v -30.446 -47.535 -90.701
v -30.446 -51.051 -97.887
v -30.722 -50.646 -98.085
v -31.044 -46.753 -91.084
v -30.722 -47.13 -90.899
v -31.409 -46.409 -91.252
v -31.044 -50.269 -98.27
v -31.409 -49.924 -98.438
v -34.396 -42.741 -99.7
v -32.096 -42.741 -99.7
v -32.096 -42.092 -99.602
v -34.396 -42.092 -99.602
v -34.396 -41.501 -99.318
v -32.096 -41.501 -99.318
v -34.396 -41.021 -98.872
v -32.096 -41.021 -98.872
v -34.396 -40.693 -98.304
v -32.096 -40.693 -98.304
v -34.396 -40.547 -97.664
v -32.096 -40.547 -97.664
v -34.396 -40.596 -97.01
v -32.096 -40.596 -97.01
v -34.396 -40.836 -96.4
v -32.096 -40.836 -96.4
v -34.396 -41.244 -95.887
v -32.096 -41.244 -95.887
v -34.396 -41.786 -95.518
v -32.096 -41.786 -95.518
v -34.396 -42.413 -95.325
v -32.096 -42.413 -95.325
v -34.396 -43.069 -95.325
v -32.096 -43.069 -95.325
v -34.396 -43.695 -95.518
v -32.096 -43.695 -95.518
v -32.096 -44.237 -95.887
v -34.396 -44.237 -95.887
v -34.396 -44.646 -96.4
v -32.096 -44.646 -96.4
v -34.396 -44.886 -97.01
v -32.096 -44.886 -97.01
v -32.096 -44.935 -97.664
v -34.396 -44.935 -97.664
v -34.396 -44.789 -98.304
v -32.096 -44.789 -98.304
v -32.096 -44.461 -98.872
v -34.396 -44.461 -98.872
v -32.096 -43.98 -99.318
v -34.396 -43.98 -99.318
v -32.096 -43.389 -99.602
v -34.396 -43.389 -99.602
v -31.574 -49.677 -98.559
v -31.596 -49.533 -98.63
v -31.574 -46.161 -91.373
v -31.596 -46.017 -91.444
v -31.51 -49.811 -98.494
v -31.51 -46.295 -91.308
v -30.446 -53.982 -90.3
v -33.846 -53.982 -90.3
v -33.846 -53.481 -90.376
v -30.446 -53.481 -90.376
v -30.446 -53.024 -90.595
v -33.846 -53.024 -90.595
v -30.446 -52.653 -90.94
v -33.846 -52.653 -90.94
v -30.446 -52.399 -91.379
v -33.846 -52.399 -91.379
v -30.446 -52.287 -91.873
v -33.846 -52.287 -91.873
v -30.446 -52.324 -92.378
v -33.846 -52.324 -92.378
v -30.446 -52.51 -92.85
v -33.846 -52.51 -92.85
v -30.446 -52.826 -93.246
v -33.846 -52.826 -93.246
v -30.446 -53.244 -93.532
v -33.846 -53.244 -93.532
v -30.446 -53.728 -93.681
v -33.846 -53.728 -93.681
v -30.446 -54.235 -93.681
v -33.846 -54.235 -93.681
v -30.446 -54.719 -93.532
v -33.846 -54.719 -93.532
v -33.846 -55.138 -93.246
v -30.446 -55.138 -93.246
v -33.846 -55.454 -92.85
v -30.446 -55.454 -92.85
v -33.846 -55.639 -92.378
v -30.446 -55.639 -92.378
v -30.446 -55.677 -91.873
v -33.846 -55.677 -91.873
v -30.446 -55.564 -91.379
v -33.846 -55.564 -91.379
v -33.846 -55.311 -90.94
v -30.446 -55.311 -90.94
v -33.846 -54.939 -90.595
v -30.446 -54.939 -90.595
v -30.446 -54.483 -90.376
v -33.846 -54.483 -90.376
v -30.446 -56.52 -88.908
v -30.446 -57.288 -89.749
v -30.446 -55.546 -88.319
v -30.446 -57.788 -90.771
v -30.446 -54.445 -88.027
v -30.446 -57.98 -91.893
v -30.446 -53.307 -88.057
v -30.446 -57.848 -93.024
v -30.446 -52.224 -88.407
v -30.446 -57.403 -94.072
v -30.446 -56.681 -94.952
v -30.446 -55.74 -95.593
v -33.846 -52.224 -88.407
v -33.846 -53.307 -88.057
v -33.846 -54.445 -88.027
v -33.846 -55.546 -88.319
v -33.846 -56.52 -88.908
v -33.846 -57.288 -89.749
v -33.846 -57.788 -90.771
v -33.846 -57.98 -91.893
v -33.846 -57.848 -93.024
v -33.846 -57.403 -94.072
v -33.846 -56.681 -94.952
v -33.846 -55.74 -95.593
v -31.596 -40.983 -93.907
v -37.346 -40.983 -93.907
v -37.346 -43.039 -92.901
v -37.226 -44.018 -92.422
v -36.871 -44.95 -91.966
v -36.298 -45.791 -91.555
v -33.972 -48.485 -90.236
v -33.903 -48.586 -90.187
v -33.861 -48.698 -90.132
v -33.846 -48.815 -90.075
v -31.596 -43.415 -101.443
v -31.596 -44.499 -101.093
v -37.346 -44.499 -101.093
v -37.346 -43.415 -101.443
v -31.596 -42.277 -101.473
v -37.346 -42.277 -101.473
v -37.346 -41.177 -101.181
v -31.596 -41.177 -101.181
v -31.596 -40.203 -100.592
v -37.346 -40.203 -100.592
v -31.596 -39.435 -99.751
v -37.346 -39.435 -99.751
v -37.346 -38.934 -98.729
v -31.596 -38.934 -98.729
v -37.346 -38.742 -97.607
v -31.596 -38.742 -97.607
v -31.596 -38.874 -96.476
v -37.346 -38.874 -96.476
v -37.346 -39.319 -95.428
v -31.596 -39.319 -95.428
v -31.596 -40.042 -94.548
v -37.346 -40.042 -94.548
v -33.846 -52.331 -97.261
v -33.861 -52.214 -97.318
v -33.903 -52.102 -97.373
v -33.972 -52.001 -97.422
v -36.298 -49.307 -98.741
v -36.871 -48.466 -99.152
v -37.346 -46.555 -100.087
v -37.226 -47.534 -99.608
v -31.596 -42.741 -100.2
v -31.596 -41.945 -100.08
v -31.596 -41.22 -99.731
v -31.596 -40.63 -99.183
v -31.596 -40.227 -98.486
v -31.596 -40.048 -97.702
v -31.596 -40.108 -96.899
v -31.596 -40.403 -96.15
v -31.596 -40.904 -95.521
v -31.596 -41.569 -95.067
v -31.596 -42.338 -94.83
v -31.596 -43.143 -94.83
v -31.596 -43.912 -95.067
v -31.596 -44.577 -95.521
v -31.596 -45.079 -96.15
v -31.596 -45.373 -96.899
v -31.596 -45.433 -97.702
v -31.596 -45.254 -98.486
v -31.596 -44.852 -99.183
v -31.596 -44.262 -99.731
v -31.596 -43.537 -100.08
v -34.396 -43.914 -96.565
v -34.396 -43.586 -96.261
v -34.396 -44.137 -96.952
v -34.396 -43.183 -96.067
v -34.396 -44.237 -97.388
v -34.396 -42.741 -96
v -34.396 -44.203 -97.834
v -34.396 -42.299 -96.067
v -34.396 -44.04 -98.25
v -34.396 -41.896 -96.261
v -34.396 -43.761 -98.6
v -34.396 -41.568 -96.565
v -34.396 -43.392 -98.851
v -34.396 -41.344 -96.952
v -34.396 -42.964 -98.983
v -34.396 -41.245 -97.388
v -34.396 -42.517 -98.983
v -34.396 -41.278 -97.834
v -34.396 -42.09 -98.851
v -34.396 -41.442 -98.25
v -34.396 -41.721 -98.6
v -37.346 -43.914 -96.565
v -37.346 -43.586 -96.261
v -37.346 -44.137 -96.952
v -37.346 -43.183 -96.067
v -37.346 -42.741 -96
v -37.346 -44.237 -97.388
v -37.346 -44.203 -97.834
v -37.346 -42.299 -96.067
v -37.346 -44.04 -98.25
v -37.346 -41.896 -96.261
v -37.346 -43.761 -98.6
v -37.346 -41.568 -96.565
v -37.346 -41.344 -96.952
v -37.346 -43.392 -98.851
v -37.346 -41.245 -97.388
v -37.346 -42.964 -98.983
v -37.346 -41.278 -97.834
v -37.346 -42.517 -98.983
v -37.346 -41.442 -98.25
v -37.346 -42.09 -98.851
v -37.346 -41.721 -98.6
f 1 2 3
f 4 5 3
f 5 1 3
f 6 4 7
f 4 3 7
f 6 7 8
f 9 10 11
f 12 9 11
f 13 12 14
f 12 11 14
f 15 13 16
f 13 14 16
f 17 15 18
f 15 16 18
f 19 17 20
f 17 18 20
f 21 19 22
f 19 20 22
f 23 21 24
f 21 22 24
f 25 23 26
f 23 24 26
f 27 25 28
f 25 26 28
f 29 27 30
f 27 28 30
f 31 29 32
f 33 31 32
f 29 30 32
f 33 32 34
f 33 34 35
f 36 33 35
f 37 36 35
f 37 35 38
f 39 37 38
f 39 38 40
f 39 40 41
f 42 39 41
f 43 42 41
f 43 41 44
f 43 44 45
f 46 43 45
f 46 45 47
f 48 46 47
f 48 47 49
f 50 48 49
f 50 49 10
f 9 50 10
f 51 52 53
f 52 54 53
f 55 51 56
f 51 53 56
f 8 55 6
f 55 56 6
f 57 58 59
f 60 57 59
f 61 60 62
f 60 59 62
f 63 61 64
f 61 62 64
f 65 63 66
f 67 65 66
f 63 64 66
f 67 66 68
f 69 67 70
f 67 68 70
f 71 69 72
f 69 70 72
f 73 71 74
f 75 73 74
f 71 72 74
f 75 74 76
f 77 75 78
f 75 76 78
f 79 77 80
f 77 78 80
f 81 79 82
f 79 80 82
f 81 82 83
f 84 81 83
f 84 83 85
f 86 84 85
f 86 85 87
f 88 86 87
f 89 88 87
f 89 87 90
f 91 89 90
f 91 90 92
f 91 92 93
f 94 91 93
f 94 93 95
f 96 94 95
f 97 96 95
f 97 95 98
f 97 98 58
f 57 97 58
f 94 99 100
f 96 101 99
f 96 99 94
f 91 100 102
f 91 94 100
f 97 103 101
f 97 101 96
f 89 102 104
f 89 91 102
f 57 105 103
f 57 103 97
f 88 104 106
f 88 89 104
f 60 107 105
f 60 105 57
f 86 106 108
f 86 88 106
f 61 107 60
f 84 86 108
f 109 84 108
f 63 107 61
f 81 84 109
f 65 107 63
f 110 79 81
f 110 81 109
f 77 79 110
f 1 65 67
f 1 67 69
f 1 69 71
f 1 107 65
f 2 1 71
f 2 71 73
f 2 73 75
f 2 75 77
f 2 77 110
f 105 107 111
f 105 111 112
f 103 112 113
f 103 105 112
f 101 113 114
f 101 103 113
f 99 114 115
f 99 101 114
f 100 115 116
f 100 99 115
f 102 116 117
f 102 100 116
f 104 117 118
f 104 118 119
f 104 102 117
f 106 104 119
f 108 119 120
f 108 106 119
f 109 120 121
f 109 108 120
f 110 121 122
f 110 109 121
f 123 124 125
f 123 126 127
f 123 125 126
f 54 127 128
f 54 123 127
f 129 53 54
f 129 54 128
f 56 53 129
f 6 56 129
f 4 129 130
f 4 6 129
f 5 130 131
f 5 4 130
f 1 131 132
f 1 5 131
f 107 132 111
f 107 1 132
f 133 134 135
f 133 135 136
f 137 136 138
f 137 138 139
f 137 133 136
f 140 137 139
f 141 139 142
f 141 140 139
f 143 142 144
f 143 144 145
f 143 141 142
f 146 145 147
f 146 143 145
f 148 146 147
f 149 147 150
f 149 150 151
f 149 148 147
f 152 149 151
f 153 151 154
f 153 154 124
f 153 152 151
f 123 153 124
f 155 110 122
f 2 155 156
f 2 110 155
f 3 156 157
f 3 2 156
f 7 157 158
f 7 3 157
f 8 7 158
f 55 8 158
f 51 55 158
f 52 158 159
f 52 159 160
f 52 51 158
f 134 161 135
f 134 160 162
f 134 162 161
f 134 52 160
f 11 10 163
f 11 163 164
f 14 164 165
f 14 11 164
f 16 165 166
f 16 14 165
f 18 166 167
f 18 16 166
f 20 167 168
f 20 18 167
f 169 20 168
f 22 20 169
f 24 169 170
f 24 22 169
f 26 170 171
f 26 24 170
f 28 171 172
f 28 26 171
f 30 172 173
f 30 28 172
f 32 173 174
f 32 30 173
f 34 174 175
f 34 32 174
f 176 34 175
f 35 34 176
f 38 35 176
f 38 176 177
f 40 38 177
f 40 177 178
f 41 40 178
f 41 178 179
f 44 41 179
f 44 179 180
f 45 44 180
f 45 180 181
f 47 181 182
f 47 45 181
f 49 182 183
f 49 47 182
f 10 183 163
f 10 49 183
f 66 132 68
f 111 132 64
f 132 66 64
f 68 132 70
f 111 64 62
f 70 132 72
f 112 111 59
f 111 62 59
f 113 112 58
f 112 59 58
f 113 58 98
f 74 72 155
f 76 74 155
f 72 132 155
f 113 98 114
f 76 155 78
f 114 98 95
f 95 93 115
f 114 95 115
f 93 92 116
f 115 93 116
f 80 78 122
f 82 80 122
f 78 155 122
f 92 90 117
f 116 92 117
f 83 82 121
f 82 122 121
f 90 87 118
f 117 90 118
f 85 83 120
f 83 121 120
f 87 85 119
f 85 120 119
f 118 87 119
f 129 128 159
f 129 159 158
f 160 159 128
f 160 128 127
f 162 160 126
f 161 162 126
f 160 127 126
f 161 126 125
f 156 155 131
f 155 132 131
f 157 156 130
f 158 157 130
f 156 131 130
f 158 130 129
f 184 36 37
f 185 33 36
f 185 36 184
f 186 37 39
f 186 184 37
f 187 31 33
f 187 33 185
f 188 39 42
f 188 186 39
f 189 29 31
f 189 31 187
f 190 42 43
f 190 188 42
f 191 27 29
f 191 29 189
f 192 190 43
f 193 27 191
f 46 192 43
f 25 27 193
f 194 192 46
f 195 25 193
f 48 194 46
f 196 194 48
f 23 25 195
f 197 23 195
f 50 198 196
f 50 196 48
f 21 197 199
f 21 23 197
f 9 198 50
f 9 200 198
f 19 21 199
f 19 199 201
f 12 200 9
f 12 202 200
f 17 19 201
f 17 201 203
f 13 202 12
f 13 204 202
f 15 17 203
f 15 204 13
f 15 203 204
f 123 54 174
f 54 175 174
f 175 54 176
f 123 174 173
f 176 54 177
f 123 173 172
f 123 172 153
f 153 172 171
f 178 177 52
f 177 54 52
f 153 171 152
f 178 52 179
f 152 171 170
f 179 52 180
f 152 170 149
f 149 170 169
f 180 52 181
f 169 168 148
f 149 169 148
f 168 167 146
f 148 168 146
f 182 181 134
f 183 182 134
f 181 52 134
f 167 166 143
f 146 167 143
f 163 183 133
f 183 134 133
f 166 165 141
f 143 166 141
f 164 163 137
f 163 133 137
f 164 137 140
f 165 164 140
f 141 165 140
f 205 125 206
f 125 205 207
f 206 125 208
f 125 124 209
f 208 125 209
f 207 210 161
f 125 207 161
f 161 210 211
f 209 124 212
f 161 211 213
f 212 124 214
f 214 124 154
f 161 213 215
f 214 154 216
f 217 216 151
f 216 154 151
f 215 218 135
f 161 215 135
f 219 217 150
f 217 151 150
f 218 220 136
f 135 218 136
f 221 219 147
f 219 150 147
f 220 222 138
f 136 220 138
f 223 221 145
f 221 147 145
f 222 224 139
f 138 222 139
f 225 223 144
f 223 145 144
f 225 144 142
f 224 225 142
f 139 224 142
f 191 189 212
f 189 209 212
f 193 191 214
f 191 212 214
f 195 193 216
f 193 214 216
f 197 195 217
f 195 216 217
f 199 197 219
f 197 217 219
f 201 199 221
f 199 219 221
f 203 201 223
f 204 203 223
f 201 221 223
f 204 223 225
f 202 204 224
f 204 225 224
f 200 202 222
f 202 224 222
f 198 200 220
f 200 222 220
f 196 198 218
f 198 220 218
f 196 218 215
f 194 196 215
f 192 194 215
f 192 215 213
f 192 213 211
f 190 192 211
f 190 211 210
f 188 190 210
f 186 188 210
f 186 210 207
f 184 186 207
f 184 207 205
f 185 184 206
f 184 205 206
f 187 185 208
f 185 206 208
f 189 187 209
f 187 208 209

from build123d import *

# Parameters (mm, degrees)
BOSS_EXTRUDE1_DEPTH = 6.9
CUT_EXTRUDE1_DEPTH  = 41.174882094
CUT_EXTRUDE2_DEPTH  = 41.174882094
HOLE1_D             = 3.4
HOLE2_D             = 3
HOLE2_CBORE_D       = 4.4
HOLE2_CBORE_DEPTH   = 2.8
FILLET1_R           = 0.6
FILLET2_R           = 5
CHAMFER2_SIZE       = 0.5


with BuildPart() as part:
    # Sketch1 → Boss-Extrude1 (new body)
    with BuildSketch(Plane(origin=(-30.446370889, 0, 0), x_dir=(0, 0, -1), z_dir=(1, 0, 0))):
        with BuildLine():
            Line((93.90701583, -40.982811072), (88.40701583, -52.223840783))
            ThreePointArc((88.40701583, -52.223840783), (90.242028227, -57.574796726), (95.59298417, -55.739784329))
            Line((95.59298417, -55.739784329), (101.09298417, -44.498754618))
            ThreePointArc((101.09298417, -44.498754618), (99.257971773, -39.147798675), (93.90701583, -40.982811072))
        make_face()
    extrude(amount=-BOSS_EXTRUDE1_DEPTH)

    # Sketch2 → Cut-Extrude1 (cut, through all)
    with BuildSketch(Plane(origin=(0, -48.50387467, -99.133362956), x_dir=(-1, 0, 0), z_dir=(0, -0.43949294330941685, -0.8982460424523036))):
        Polygon((37.346370889, 0.458822931), (33.846370889, -4.055598708), (33.846370889, -14.237691346), (37.346370889, -14.237691346), align=None)
    extrude(amount=-CUT_EXTRUDE1_DEPTH, mode=Mode.SUBTRACT)

    # Sketch3 → Cut-Extrude2 (cut, through all)
    with BuildSketch(Plane(origin=(0, -48.50387467, -99.133362956), x_dir=(-1, 0, 0), z_dir=(0, -0.4394929433094169, -0.8982460424523037))):
        with BuildLine():
            Line((29.844897196, 8.580951501), (29.844897196, -5.213665722))
            ThreePointArc((29.844897196, -5.213665722), (30.303827303, -3.12113514), (31.596370889, -1.412734673))
            Line((31.596370889, -1.412734673), (31.596370889, 8.580951501))
            Line((31.596370889, 8.580951501), (29.844897196, 8.580951501))
        make_face()
    extrude(amount=-CUT_EXTRUDE2_DEPTH, mode=Mode.SUBTRACT)

    # Hole1 (through all)
    with Locations(Plane(origin=(-30.446370889, 0, 0), x_dir=(0, 0, -1), z_dir=(1, 0, 0))):
        with Locations((92, -53.981812556)):
            Hole(HOLE1_D / 2)

    # Hole2 (through all)
    with Locations(Plane(origin=(-31.596370889, 0, 0), x_dir=(0, 0, -1), z_dir=(1, 0, 0))):
        with Locations((97.5, -42.740782845)):
            CounterBoreHole(HOLE2_D / 2, HOLE2_CBORE_D / 2, HOLE2_CBORE_DEPTH)

    # Fillet1
    fillet1_edges = [part.edges().sort_by_distance(p)[0] for p in [
        (-33.846370889, -50.388828386, -93.757971773),
        (-31.596370889, -48.014886226, -94.919491867),
    ]]
    fillet(fillet1_edges, radius=FILLET1_R)

    # Fillet2
    fillet2_edges = [part.edges().sort_by_distance(p)[0] for p in [
        (-37.346370889, -46.333767015, -95.742028227),
    ]]
    fillet(fillet2_edges, radius=FILLET2_R)

    # Chamfer2
    chamfer2_edges = [part.edges().sort_by_distance(p)[0] for p in [
        (-31.596370889, -42.740782845, -95.3),
    ]]
    chamfer(chamfer2_edges, length=CHAMFER2_SIZE)


solid = part.part
